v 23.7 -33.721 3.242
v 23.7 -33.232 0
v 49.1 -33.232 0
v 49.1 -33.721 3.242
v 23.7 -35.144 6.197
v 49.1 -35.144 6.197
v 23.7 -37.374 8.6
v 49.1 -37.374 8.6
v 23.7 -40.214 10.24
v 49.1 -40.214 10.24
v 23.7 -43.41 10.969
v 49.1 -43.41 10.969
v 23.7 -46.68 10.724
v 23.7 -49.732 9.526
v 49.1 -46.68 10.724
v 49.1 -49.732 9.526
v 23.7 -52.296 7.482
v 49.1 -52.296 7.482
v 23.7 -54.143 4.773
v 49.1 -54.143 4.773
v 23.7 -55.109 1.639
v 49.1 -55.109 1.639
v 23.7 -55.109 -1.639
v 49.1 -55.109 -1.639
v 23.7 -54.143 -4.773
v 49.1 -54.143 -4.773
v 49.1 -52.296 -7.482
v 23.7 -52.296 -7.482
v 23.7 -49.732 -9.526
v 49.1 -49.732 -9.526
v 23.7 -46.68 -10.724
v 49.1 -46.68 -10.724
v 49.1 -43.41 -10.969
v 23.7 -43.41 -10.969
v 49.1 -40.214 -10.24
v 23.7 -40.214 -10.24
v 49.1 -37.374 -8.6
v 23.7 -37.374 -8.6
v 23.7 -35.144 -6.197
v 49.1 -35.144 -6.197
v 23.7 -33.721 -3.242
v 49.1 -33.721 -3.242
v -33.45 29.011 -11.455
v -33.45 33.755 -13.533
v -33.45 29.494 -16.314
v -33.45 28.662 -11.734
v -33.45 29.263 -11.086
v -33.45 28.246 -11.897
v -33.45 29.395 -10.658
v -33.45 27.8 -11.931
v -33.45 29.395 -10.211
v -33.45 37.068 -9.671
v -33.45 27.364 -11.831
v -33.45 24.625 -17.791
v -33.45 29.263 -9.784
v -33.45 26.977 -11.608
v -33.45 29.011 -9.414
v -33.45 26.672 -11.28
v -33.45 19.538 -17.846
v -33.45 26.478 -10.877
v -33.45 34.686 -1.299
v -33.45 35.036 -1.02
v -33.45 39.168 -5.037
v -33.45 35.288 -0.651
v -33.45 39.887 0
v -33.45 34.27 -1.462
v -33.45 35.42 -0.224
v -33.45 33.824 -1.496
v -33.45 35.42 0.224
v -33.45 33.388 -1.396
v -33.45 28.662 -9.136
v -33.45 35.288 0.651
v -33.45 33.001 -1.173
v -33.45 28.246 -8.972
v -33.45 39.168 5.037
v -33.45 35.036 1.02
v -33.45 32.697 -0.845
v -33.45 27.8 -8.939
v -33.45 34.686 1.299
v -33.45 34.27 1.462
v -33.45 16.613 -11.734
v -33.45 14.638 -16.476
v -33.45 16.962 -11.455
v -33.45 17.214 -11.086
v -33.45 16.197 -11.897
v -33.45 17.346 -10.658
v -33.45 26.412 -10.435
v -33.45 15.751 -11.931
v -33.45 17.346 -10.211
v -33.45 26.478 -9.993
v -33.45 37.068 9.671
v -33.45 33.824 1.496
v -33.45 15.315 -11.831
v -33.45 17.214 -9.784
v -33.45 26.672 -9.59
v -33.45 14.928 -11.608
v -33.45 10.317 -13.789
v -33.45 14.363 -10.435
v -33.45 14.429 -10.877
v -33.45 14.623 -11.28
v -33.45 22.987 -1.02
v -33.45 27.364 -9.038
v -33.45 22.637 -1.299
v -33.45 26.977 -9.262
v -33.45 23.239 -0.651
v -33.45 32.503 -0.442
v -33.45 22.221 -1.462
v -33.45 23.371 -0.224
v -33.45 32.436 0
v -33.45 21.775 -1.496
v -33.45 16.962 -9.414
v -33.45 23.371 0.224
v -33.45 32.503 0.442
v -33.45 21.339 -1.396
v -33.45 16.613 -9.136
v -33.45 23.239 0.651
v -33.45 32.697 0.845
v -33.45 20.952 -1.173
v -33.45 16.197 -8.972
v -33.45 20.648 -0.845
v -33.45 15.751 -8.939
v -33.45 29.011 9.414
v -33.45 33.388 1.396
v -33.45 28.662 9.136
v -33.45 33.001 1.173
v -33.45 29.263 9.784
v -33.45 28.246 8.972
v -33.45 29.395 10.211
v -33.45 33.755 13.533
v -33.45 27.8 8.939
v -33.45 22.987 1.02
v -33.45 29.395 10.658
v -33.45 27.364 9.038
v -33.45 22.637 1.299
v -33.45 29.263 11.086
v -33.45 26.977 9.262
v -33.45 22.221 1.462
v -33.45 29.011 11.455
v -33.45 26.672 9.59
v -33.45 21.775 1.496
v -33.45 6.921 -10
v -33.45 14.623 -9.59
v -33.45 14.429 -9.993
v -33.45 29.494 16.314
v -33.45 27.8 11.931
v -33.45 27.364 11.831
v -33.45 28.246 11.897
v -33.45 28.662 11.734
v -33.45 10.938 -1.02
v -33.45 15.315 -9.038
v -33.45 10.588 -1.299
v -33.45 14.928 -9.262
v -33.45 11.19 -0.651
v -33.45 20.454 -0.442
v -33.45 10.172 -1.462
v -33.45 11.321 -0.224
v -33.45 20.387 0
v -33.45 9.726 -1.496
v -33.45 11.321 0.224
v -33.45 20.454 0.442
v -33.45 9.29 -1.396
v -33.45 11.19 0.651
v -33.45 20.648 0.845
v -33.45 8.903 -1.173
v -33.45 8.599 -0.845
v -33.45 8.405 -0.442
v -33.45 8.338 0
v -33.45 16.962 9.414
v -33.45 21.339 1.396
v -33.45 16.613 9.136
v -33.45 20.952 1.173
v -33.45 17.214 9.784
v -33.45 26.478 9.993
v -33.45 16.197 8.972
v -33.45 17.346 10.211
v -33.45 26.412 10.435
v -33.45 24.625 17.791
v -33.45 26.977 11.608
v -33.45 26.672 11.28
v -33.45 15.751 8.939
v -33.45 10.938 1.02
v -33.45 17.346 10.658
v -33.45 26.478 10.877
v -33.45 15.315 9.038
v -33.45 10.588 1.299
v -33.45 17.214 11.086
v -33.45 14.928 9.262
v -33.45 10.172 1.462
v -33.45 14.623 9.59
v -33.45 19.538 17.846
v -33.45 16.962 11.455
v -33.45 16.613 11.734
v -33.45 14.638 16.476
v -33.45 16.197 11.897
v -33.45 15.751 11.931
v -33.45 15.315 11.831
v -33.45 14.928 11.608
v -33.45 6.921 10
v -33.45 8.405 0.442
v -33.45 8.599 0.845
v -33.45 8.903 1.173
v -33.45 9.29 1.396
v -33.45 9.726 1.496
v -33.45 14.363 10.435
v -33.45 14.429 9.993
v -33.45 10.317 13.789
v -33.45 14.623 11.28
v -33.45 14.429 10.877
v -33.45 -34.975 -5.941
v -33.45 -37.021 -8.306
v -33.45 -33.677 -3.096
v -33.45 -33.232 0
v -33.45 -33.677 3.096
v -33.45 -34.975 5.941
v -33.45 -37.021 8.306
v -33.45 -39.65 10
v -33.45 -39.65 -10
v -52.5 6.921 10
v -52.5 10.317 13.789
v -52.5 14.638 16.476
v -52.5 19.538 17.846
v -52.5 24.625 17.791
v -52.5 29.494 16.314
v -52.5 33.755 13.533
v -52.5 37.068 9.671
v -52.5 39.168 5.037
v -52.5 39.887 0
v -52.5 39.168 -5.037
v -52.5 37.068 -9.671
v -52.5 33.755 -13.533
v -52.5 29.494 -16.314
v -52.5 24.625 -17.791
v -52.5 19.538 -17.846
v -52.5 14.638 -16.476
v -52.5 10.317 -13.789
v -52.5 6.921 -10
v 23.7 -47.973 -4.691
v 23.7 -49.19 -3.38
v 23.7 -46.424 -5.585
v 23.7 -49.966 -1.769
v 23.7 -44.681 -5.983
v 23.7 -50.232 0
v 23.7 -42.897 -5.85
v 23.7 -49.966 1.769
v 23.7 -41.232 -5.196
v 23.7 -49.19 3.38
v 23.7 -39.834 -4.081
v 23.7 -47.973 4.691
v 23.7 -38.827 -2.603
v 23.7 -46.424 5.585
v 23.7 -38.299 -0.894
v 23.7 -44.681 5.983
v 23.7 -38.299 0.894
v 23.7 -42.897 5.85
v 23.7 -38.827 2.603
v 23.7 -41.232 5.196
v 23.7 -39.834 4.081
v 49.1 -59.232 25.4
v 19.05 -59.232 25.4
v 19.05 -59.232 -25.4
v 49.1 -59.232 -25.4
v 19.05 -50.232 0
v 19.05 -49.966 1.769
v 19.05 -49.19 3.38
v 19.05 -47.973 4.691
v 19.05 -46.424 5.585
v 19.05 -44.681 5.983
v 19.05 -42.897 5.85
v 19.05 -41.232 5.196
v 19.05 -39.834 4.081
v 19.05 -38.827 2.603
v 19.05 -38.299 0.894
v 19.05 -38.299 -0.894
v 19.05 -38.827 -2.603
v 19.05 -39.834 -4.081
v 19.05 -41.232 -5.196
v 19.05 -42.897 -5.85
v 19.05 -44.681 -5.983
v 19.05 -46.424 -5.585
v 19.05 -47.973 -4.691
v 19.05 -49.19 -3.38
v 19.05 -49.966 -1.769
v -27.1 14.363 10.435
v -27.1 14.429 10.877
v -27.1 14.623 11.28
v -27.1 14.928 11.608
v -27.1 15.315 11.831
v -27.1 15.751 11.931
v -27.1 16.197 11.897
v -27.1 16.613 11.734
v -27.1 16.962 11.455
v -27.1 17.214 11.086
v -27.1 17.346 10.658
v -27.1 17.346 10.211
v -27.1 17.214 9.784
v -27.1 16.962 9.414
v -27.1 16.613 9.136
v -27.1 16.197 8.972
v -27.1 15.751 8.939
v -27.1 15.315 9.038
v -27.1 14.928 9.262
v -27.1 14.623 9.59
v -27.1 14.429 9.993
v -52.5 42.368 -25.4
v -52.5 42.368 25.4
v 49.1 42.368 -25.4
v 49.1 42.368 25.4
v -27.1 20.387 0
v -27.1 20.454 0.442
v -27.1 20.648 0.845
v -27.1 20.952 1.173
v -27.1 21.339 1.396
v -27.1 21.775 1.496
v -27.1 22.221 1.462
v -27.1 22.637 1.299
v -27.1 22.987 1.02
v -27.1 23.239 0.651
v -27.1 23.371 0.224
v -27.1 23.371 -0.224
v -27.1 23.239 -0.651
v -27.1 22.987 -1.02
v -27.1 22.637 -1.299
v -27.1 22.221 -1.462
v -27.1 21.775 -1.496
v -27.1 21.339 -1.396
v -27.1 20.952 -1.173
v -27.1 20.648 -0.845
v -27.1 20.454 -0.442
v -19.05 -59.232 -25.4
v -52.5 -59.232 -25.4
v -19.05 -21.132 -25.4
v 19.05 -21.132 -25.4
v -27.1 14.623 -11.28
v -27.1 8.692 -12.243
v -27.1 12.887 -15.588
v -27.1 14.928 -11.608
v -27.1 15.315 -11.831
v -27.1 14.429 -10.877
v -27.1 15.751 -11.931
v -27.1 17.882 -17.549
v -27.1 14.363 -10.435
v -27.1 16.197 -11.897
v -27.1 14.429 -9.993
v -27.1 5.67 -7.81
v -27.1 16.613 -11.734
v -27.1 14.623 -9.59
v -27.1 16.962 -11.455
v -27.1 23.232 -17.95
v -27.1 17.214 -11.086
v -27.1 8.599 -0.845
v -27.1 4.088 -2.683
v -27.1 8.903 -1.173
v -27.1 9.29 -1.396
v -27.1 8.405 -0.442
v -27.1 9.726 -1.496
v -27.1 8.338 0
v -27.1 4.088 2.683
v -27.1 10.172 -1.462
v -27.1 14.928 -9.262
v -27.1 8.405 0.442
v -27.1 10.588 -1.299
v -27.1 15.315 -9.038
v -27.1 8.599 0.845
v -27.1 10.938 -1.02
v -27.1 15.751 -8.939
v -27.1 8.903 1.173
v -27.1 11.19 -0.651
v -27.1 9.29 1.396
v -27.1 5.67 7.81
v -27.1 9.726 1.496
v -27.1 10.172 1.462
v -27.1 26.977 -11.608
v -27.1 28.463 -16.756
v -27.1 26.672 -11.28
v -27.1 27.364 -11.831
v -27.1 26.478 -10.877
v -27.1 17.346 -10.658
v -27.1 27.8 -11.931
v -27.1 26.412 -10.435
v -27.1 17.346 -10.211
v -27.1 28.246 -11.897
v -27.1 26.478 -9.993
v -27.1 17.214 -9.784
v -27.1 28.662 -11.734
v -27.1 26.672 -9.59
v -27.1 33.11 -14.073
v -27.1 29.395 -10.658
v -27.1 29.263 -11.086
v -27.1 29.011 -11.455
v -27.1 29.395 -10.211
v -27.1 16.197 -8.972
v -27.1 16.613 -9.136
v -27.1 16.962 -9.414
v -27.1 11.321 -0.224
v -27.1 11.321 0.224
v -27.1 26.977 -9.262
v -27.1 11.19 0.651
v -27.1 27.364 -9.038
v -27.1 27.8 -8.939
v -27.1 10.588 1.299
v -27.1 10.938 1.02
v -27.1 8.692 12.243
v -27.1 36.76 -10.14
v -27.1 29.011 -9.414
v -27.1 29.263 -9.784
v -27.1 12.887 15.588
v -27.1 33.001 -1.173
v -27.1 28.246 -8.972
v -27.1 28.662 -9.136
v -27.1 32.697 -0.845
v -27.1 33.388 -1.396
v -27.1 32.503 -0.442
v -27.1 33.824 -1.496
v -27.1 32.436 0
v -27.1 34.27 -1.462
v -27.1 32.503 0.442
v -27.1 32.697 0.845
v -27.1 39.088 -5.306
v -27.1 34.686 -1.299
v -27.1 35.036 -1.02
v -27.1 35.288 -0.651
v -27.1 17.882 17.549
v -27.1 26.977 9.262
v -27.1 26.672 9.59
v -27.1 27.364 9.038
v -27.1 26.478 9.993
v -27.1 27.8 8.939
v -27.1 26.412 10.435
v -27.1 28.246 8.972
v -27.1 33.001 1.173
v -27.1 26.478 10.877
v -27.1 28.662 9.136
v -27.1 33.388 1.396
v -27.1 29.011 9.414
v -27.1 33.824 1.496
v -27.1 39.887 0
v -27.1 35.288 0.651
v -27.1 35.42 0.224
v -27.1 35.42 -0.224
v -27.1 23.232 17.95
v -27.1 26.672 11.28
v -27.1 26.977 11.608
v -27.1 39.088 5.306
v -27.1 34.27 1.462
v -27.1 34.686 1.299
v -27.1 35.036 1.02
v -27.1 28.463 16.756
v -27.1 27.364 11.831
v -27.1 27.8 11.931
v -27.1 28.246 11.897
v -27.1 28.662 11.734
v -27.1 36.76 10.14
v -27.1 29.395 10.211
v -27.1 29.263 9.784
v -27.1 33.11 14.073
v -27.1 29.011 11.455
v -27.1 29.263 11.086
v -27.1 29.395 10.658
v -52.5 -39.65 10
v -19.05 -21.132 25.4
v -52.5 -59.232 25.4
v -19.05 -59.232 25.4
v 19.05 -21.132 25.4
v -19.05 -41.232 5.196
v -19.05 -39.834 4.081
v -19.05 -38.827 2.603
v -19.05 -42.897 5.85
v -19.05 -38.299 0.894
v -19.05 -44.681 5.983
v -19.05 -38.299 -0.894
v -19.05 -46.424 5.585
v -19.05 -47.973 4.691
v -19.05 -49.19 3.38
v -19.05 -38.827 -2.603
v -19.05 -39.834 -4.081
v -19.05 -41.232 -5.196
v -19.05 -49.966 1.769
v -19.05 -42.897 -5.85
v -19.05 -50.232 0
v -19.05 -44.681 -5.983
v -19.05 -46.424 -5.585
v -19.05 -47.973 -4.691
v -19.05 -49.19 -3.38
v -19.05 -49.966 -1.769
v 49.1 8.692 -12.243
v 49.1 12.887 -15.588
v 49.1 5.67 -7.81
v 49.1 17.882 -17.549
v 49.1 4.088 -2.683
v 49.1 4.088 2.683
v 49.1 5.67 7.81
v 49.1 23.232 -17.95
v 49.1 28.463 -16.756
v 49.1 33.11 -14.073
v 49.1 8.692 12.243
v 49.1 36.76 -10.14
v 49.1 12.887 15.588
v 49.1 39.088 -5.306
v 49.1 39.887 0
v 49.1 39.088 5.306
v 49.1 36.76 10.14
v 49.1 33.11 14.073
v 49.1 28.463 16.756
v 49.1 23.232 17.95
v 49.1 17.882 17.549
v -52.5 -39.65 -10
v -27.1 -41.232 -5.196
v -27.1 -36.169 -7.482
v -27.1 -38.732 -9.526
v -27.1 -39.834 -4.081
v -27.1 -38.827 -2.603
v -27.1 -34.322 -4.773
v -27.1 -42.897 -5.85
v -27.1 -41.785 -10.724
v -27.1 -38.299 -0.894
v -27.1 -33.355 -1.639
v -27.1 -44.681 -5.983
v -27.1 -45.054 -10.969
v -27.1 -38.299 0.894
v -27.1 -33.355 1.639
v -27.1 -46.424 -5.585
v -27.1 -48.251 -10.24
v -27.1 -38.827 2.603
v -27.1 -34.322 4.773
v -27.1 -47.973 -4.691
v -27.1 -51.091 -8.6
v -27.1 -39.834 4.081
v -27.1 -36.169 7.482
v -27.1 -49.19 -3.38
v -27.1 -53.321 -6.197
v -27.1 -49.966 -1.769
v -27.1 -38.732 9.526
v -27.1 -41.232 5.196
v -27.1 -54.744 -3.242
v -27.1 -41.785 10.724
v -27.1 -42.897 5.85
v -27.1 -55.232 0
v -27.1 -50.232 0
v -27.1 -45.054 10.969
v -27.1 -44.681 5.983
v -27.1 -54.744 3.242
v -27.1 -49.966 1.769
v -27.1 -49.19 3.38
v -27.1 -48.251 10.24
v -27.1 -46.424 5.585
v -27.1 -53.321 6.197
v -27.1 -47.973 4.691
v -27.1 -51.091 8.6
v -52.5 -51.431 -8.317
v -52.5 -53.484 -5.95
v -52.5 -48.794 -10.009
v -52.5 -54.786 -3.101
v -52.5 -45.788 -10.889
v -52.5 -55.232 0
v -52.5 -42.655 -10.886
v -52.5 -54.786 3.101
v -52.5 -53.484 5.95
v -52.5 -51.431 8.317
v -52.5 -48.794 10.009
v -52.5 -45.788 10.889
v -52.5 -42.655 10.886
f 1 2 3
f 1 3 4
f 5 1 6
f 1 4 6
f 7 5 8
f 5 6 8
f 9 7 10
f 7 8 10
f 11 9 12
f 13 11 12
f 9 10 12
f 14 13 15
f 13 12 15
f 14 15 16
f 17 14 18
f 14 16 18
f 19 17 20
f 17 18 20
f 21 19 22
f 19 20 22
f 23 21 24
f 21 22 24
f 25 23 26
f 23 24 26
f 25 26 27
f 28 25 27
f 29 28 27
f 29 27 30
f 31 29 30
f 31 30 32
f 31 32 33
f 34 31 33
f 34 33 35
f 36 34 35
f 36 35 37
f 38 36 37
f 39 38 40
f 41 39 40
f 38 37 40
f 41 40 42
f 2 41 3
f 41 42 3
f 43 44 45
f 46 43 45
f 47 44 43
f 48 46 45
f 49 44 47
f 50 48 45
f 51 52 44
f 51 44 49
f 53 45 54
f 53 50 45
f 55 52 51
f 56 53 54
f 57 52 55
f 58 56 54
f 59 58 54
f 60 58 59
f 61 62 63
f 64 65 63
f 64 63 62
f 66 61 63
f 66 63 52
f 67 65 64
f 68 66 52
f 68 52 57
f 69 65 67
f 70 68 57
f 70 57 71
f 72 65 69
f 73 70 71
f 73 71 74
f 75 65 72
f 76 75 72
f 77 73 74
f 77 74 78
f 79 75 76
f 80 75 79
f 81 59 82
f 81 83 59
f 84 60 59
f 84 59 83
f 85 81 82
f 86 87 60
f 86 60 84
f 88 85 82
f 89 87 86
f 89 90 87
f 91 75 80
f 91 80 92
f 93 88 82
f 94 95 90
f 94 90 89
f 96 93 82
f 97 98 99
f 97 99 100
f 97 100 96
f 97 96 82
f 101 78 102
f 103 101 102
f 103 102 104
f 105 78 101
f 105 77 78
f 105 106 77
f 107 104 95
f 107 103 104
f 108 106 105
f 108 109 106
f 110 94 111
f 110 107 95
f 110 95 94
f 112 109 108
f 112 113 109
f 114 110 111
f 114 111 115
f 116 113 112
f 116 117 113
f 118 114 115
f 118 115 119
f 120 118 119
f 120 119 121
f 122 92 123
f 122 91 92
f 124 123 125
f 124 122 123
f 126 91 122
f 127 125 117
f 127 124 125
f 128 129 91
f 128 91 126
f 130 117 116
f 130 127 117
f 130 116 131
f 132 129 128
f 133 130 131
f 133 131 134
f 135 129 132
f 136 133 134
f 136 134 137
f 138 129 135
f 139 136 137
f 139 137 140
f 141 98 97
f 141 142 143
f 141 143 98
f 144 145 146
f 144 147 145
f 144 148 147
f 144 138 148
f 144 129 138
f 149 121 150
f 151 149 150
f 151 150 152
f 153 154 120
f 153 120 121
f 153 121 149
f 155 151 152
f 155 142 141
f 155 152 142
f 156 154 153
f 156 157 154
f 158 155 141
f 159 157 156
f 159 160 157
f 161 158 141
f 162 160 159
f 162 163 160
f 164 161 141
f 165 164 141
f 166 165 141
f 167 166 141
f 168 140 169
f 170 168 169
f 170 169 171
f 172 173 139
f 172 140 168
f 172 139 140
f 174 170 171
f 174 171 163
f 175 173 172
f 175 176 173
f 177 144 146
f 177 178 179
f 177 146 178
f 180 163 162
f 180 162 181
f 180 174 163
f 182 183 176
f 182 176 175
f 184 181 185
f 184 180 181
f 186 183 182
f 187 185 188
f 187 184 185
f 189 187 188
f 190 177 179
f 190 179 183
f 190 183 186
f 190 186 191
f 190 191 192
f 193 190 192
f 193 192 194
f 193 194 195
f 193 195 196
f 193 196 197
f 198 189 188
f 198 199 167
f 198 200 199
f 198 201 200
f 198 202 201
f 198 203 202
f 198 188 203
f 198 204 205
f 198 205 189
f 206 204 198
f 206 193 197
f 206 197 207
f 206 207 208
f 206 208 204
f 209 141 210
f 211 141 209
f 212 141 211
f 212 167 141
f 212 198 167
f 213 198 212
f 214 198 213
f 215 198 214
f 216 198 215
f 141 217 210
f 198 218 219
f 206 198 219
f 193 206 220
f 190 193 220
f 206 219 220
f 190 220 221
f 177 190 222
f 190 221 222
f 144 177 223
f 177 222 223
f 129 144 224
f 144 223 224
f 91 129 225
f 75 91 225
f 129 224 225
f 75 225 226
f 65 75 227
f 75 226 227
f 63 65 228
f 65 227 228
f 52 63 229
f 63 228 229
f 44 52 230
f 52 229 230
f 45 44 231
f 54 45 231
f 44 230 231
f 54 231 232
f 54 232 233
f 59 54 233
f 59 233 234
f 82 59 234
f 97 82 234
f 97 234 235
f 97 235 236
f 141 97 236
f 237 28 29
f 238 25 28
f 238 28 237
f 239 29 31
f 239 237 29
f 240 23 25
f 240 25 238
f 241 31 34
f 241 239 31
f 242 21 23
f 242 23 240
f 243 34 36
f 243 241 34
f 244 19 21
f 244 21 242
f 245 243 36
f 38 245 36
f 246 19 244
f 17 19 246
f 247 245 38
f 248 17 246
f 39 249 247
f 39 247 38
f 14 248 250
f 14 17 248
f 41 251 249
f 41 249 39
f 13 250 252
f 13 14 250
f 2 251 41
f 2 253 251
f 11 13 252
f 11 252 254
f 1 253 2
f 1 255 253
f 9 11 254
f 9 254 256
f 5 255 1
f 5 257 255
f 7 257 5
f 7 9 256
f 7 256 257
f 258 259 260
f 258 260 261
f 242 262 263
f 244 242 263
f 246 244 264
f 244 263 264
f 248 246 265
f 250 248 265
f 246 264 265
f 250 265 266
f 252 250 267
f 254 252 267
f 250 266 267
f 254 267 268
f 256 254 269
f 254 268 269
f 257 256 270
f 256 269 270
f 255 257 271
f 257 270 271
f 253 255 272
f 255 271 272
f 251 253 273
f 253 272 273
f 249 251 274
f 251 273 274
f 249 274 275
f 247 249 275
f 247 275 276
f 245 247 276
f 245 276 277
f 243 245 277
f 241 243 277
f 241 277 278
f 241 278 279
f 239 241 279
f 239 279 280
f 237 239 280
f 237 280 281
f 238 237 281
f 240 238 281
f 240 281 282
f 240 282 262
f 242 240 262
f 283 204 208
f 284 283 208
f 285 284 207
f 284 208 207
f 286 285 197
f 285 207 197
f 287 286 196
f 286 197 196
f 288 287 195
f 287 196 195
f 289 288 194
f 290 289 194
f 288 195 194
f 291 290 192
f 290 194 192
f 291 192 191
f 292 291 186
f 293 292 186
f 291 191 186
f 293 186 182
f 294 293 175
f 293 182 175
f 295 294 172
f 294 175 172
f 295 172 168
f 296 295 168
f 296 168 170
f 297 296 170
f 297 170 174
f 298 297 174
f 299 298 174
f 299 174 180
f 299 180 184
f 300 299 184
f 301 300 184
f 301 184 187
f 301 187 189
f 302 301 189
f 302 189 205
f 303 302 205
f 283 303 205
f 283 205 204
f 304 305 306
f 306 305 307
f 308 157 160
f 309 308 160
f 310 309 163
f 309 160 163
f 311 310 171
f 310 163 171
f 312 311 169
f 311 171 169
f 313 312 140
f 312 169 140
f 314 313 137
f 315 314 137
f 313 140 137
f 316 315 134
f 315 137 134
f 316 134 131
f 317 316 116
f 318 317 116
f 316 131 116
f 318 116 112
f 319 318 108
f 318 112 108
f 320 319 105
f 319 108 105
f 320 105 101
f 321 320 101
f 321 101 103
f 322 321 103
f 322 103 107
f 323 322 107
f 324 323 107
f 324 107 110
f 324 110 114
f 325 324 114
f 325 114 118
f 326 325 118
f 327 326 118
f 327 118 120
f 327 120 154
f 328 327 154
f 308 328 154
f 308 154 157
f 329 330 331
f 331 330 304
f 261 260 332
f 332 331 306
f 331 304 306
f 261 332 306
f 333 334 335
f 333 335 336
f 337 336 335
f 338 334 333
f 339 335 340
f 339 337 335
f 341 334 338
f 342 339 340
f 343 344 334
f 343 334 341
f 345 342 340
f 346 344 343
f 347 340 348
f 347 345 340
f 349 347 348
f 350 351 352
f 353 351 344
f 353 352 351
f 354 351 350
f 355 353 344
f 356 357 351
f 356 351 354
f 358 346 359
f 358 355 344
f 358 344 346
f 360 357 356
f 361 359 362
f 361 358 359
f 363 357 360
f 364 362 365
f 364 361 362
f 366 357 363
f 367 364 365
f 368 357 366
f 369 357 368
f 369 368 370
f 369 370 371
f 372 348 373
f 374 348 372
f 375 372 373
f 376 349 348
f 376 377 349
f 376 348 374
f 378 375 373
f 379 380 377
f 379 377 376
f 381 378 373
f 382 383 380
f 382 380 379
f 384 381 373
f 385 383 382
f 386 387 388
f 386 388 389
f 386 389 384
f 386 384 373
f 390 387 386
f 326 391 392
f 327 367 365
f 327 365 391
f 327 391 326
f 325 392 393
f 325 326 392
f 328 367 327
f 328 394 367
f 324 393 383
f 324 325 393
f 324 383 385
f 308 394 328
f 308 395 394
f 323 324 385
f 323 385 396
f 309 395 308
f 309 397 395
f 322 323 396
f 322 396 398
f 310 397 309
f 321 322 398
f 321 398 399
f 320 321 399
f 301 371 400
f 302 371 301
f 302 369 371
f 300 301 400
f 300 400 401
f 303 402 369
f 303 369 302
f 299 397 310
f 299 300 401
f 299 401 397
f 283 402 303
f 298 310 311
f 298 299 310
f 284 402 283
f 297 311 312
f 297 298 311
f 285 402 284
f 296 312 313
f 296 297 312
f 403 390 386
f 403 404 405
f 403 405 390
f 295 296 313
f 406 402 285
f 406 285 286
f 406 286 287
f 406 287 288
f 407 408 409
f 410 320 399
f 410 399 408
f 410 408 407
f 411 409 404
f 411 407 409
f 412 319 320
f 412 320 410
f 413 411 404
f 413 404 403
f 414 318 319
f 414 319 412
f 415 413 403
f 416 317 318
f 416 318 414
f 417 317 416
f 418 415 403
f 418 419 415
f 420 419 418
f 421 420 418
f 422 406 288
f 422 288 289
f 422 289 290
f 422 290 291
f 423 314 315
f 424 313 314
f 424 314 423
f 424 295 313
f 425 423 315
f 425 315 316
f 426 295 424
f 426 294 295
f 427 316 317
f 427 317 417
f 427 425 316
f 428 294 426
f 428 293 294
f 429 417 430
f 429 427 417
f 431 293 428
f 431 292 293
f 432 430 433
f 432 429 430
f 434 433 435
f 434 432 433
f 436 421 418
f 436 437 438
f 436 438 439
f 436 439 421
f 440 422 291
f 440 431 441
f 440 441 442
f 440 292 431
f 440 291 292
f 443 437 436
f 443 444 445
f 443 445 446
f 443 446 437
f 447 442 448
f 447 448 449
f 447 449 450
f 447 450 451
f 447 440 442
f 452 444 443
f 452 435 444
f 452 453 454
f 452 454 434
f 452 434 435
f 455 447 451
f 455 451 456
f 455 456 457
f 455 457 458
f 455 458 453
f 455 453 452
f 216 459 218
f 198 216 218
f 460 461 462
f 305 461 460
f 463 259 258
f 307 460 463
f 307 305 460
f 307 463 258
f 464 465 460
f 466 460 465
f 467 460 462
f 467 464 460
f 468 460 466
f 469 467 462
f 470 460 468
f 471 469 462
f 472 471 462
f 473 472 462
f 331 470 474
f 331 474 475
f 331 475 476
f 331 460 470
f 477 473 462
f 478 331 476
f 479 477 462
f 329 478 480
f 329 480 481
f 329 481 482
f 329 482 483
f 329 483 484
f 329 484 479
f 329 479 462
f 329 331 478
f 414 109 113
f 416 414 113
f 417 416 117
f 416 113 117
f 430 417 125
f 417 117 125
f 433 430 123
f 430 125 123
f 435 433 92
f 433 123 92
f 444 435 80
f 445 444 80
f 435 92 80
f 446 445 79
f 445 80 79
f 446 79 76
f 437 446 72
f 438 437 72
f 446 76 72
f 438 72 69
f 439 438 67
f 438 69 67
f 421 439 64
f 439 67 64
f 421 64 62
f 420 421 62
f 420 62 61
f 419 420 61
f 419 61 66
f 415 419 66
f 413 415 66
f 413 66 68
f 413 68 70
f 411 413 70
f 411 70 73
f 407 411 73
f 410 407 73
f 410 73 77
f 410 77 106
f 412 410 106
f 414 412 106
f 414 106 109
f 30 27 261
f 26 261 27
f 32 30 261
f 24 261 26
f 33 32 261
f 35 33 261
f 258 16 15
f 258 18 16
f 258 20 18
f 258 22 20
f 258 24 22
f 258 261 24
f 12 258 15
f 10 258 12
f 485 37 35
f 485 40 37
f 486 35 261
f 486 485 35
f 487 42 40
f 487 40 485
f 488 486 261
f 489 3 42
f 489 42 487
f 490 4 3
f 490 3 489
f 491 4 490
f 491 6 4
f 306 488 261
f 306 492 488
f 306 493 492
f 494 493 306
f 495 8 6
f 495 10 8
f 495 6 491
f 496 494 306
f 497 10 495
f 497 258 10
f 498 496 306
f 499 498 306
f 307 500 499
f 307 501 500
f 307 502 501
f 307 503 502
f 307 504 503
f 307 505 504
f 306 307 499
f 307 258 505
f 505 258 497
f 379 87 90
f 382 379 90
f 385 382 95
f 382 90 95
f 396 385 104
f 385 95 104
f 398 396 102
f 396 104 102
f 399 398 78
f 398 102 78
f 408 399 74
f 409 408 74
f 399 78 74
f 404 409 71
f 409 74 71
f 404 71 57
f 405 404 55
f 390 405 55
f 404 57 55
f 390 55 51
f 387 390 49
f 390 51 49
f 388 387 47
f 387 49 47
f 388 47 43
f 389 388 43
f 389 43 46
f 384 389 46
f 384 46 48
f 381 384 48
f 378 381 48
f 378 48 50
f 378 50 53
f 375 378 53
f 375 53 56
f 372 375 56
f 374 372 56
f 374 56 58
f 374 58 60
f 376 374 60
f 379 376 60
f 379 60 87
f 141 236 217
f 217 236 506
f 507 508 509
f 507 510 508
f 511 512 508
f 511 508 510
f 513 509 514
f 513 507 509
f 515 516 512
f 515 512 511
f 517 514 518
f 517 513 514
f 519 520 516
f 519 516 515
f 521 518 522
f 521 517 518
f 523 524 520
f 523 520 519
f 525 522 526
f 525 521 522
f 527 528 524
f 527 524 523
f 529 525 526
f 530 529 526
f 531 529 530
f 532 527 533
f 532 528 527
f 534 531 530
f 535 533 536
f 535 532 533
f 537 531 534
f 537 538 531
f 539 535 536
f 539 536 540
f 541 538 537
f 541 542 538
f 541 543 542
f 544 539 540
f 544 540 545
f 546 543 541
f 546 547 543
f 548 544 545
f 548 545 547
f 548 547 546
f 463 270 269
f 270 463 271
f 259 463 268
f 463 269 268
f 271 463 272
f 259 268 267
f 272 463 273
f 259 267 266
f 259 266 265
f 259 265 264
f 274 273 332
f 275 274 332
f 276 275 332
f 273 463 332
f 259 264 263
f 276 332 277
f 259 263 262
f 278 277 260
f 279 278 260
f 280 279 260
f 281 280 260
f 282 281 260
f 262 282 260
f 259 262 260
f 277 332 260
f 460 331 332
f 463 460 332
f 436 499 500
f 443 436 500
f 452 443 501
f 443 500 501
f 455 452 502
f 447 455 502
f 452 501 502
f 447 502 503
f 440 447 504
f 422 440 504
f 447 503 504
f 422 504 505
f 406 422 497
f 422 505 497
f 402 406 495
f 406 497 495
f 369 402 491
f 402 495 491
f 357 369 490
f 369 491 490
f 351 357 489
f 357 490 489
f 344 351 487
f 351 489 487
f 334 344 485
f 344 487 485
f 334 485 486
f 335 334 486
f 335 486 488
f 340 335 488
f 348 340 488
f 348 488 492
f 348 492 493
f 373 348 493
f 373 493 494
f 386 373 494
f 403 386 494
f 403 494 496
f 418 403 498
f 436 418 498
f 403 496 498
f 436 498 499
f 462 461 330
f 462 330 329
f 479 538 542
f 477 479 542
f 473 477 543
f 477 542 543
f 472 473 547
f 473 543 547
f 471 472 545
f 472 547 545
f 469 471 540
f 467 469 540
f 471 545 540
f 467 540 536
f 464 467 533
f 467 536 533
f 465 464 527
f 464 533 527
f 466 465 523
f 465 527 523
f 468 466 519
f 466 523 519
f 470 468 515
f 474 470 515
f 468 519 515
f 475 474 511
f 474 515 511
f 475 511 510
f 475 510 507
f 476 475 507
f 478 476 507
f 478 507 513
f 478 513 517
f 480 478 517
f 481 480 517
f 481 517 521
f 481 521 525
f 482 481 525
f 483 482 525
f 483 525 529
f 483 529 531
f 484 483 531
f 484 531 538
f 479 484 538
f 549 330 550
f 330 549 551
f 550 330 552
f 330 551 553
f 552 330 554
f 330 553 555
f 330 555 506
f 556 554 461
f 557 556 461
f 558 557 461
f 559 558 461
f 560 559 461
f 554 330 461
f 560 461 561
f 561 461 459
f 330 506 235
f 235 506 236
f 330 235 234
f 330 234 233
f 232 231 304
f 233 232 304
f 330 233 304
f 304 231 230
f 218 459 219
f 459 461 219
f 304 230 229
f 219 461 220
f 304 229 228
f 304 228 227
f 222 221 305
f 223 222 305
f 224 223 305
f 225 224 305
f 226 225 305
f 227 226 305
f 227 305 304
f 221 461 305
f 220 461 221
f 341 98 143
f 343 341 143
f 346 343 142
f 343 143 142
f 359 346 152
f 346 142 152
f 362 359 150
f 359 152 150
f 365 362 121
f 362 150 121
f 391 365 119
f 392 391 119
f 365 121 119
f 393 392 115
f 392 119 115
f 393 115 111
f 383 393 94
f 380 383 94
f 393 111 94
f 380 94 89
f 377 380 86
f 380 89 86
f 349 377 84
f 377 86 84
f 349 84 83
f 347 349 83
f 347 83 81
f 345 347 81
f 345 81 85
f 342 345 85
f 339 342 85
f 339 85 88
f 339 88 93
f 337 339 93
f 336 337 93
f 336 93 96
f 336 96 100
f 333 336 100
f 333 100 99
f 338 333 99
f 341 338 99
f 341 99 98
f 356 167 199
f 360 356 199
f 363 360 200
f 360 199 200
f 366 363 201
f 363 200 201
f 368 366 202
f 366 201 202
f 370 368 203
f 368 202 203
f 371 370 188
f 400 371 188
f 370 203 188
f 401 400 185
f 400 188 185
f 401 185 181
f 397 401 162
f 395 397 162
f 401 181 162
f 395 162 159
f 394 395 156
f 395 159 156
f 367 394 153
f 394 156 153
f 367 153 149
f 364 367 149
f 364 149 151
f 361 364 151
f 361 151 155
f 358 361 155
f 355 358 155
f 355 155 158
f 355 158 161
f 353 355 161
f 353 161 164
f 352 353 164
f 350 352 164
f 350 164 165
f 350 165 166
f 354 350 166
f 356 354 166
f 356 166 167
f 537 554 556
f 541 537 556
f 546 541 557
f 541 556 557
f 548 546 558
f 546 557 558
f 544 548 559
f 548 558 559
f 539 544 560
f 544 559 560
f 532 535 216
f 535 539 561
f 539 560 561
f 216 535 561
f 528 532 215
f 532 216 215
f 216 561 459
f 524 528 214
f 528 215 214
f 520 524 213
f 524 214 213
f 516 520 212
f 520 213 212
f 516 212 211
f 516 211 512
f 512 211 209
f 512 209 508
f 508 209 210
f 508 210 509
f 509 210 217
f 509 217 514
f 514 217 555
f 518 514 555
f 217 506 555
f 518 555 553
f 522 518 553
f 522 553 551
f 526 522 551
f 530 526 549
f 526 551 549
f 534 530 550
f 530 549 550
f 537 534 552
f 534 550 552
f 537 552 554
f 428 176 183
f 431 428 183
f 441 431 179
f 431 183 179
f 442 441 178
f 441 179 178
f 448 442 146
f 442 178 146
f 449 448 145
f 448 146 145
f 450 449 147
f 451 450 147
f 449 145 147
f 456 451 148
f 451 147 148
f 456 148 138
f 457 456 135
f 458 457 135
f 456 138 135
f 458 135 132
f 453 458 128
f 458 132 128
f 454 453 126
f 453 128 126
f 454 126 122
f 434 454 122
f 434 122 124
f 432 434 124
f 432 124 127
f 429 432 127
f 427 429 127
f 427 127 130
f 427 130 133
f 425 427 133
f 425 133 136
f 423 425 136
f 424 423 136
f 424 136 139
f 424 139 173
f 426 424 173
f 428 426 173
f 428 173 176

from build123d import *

# Parameters (mm, degrees)
F0_W      = 101.6
F0_H      = 101.6
F1_DEPTH  = 25.4
F2_R      = 18
F3_DEPTH  = 76.2
F4_R      = 18
F5_DEPTH  = 19.05
F6_R      = 1.5
F7_DEPTH  = 25
F8_R      = 11
F9_DEPTH  = 25.4
F10_R     = 11
F11_DEPTH = 25.4
F12_W     = 38.1
F12_H     = 43.3616997044
F13_DEPTH = 50.801
F14_R     = 6
F15_DEPTH = 76.201
F17_DEPTH = 19.05


# Not quite as in the source:
# - a length typed as a fraction of an inch, garbled in the dataset ("3 / 203.2 mm" for 3/8 in), is restored


with BuildPart() as f1:
    # F0 (on Top) → F1 (new body, symmetric)
    with BuildSketch(Plane.XY):
        with Locations((-1.7001610249, -8.4323180143)):
            Rectangle(F0_W, F0_H)
    extrude(amount=F1_DEPTH, both=True)

    # F2 (on face) → F3 (cut)
    with BuildSketch(Plane.YZ.offset(49.0998389751)):
        with Locations((21.8872688711, 0)):
            Circle(F2_R)
    extrude(amount=-F3_DEPTH, mode=Mode.SUBTRACT)

    # F4 (on face) → F5 (cut)
    with BuildSketch(Plane(origin=(-52.5001610249, 0, 0), x_dir=(0, -1, 0), z_dir=(-1, 0, 0))):
        with Locations((-21.8872688711, 0)):
            Circle(F4_R)
    extrude(amount=-F5_DEPTH, mode=Mode.SUBTRACT)

    # F6 (on face) → F7 (cut)
    with BuildSketch(Plane(origin=(-33.4501610249, 0, 0), x_dir=(0, -1, 0), z_dir=(-1, 0, 0))):
        with Locations((-21.8872688711, 0)):
            Circle(F6_R)
        with Locations((-9.838248603, 0)):
            Circle(F6_R)
        with Locations((-15.8627587371, 10.4347576428)):
            Circle(F6_R)
        with Locations((-27.9117790051, 10.4347576428)):
            Circle(F6_R)
        with Locations((-33.9362891391, 0)):
            Circle(F6_R)
        with Locations((-27.9117790051, -10.4347576428)):
            Circle(F6_R)
        with Locations((-15.8627587371, -10.4347576428)):
            Circle(F6_R)
    extrude(amount=-F7_DEPTH, mode=Mode.SUBTRACT)

    # F8 (on face) → F9 (cut)
    with BuildSketch(Plane(origin=(-52.5001610249, 0, 0), x_dir=(0, -1, 0), z_dir=(-1, 0, 0))):
        with Locations((44.2323180143, 0)):
            Circle(F8_R)
    extrude(amount=-F9_DEPTH, mode=Mode.SUBTRACT)

    # F10 (on face) → F11 (cut)
    with BuildSketch(Plane.YZ.offset(49.0998389751)):
        with Locations((-44.2323180143, 0)):
            Circle(F10_R)
    extrude(amount=-F11_DEPTH, mode=Mode.SUBTRACT)

    # F12 (on face) → F13 (cut, through all)
    with BuildSketch(Plane(origin=(0, 0, -25.4), x_dir=(1, 0, 0), z_dir=(0, 0, -1))):
        with Locations((0, 42.8131678666)):
            Rectangle(F12_W, F12_H)
    extrude(amount=-F13_DEPTH, mode=Mode.SUBTRACT)

    # F14 (on face) → F15 (cut, through all)
    with BuildSketch(Plane(origin=(-27.1001610249, 0, 0), x_dir=(0, -1, 0), z_dir=(-1, 0, 0))):
        with Locations((44.2323180143, 0)):
            Circle(F14_R)
    extrude(amount=-F15_DEPTH, mode=Mode.SUBTRACT)

    # F16 (on face) → F17 (cut)
    with BuildSketch(Plane(origin=(-52.5001610249, 0, 0), x_dir=(0, -1, 0), z_dir=(-1, 0, 0))):
        with BuildLine():
            Line((-21.8872688711, -10), (44.2323180143, -10))
            ThreePointArc((44.2323180143, -10), (54.2323180143, 0), (44.2323180143, 10))
            Line((44.2323180143, 10), (-21.8872688711, 10))
            ThreePointArc((-21.8872688711, 10), (-31.8872688711, 0), (-21.8872688711, -10))
        make_face()
    extrude(amount=-F17_DEPTH, mode=Mode.SUBTRACT)


solid = f1.part
